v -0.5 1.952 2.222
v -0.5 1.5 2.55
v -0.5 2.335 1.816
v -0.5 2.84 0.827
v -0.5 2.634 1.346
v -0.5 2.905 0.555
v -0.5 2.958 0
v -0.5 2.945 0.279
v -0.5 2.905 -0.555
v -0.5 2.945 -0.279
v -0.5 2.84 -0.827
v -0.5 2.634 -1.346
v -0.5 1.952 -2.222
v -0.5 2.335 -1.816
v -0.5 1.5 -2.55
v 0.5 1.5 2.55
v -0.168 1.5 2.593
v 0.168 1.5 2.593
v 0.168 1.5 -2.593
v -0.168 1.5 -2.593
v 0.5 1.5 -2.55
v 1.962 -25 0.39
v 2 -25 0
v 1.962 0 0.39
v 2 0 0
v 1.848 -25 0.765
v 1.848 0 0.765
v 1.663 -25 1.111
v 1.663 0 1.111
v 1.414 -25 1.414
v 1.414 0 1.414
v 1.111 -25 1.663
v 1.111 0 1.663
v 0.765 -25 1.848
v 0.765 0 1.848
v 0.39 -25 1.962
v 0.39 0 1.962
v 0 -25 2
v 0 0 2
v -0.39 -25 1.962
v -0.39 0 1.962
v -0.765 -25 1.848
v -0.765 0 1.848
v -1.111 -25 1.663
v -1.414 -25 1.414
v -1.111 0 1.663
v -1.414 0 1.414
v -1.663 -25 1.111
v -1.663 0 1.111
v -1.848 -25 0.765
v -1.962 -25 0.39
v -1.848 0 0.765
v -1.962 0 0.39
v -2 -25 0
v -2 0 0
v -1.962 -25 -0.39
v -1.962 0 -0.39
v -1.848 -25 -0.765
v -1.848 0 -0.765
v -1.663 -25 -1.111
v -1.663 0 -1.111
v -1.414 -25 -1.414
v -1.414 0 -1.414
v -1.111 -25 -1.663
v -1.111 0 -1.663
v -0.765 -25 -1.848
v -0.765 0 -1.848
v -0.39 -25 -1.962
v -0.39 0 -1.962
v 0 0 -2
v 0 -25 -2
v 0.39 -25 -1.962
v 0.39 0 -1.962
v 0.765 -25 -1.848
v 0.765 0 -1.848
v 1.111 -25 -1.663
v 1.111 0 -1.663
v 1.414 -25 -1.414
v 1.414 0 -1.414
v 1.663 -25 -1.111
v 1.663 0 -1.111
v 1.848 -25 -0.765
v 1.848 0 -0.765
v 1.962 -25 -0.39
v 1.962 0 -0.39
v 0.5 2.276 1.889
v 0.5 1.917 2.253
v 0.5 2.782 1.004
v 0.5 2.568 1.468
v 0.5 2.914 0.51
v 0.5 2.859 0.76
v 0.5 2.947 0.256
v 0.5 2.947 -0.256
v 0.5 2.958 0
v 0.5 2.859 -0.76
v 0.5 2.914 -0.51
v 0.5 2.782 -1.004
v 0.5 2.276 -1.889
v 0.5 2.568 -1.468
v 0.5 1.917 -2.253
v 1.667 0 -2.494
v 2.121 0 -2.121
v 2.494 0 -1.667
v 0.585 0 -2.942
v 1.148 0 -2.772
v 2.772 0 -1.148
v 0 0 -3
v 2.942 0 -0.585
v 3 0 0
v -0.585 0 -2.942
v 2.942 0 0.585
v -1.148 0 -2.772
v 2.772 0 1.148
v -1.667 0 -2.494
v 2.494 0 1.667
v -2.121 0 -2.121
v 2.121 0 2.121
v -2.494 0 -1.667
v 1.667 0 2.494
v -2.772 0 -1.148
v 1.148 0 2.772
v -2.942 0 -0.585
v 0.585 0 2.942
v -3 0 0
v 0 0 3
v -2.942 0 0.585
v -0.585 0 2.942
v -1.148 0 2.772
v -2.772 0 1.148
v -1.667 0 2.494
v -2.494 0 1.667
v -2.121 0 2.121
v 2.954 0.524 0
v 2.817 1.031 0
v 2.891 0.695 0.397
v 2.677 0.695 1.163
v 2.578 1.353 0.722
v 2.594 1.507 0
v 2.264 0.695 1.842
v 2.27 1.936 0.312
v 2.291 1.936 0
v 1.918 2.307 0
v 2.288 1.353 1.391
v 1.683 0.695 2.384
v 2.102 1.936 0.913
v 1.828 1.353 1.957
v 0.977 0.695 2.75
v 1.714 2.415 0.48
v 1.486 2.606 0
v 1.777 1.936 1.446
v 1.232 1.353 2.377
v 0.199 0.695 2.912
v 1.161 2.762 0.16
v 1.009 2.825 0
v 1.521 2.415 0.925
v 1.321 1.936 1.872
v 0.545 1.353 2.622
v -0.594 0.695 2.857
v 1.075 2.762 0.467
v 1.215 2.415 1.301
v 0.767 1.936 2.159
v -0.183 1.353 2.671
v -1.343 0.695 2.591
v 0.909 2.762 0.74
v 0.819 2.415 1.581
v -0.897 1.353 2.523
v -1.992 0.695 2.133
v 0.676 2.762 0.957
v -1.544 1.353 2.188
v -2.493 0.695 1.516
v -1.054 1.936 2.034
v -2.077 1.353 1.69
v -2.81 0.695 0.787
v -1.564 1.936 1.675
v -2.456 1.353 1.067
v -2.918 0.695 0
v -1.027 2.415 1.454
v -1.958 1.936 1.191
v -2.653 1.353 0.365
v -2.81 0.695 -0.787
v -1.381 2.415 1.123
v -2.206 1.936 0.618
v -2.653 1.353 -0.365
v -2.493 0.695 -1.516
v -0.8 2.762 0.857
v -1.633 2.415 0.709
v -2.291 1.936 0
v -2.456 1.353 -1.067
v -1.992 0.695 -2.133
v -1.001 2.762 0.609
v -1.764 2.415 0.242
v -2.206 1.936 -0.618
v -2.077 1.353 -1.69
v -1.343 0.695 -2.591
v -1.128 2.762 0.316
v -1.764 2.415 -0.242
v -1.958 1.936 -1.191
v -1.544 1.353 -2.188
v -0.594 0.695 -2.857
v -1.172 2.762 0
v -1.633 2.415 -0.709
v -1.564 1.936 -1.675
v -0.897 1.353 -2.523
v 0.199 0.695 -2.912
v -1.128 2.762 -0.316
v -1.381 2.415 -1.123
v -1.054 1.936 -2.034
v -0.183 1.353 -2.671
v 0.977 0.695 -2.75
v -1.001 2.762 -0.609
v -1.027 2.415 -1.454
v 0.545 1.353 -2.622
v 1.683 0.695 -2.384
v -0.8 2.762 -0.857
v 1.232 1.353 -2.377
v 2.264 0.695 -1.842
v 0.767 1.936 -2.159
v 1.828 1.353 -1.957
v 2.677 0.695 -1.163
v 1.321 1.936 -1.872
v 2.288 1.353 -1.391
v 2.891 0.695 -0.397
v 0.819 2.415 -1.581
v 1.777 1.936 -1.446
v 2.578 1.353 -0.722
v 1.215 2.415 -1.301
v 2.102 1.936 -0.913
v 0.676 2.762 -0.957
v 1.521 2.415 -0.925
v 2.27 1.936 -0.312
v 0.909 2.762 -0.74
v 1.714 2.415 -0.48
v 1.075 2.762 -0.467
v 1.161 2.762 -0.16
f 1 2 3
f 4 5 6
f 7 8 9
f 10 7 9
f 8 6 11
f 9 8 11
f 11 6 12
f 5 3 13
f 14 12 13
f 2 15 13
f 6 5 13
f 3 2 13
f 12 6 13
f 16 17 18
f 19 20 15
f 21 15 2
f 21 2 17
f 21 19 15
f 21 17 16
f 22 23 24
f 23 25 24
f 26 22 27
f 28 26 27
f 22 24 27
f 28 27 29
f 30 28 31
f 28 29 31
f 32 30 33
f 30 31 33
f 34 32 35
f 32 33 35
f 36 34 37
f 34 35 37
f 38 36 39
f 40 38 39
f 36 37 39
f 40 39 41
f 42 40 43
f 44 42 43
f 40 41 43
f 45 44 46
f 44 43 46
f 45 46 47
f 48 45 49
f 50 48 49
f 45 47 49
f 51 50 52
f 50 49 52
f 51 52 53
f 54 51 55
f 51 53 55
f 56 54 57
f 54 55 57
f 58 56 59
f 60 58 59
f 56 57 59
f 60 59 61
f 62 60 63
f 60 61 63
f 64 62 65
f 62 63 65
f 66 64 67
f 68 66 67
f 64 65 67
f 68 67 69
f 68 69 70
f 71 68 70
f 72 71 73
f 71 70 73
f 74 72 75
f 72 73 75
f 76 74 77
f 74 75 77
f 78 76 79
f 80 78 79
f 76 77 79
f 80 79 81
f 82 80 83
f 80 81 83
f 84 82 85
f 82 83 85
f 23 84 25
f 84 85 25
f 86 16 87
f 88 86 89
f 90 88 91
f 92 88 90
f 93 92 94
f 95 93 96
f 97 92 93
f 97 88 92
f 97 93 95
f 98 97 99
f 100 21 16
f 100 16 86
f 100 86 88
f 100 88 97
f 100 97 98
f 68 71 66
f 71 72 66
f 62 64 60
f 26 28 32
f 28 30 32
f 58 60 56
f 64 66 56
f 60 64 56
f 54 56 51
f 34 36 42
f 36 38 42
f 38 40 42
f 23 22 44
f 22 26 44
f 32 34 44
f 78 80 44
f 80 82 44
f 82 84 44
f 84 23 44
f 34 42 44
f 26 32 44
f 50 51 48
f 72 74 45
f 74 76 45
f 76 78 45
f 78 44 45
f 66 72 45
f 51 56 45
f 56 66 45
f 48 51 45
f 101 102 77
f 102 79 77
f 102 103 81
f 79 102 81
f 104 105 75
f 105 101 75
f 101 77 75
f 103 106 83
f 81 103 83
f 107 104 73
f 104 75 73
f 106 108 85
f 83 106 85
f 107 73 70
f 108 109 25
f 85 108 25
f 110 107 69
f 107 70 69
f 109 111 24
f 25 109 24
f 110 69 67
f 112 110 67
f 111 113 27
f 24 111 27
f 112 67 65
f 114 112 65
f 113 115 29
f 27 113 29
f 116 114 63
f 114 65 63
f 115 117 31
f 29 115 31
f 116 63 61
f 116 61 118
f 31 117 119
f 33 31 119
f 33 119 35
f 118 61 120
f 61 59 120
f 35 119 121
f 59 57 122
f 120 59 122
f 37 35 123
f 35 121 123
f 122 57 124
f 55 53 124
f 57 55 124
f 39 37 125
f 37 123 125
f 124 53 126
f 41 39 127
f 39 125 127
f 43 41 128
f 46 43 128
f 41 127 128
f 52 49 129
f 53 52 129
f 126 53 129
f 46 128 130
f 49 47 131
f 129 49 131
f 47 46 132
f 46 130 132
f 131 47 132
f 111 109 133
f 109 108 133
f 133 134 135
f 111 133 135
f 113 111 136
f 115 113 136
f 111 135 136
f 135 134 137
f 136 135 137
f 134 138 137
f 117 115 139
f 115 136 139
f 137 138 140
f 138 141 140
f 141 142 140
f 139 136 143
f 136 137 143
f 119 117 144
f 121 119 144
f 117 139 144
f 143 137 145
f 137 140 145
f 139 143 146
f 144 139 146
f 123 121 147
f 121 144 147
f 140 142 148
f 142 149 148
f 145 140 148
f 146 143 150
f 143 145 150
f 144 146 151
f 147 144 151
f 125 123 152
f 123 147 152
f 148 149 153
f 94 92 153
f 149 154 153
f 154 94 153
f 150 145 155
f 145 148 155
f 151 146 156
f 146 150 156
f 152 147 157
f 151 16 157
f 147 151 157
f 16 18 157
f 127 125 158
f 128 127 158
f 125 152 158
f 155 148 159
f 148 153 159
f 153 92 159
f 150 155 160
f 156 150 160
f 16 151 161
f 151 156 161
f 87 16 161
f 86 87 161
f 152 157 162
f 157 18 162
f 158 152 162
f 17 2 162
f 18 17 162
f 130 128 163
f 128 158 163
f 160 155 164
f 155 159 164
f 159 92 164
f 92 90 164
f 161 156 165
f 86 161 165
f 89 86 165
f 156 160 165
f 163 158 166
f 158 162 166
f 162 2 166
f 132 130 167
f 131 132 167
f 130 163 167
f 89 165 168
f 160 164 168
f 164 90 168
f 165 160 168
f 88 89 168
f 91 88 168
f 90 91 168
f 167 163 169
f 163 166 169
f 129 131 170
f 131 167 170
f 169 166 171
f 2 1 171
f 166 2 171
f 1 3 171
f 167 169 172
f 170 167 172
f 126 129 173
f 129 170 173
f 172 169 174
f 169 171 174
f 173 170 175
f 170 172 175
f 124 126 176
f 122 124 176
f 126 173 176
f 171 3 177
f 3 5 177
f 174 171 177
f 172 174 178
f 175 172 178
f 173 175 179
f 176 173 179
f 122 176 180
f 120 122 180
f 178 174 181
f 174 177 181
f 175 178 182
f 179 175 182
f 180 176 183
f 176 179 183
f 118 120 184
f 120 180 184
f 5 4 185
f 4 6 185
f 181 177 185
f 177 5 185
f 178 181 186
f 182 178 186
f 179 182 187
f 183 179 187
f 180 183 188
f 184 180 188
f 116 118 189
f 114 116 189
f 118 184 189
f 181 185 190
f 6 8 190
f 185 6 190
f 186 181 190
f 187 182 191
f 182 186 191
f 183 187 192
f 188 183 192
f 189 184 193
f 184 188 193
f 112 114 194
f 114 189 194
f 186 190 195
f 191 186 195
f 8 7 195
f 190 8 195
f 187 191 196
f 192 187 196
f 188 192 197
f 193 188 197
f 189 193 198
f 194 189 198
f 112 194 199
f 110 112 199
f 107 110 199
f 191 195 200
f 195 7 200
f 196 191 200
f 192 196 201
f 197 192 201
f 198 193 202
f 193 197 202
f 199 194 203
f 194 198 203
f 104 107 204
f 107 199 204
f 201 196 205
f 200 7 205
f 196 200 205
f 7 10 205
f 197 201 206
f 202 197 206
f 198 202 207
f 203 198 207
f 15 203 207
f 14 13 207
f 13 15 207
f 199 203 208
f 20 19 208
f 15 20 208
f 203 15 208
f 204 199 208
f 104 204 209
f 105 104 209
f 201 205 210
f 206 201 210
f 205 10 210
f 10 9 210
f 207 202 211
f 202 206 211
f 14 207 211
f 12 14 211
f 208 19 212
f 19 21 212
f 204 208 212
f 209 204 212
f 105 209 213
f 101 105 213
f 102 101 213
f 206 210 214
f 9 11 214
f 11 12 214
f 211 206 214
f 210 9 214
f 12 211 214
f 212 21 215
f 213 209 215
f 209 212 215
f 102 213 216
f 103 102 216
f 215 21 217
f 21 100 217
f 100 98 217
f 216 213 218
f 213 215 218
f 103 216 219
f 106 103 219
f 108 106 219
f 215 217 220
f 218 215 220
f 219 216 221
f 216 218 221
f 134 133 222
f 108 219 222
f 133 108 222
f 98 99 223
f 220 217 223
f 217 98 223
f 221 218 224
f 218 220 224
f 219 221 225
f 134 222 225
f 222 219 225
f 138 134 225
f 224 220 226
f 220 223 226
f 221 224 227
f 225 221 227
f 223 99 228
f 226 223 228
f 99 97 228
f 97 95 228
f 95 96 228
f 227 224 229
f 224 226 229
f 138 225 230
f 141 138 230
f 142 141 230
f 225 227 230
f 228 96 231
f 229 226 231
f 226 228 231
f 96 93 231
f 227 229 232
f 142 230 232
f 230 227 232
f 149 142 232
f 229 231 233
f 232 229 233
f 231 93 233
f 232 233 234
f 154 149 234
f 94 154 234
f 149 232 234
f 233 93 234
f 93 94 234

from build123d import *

# Parameters (mm, degrees)
SKETCH1_W               = 2
SKETCH1_H               = 25
SKETCH2_W               = 0.5
SKETCH2_H               = 1.642734333
CUT_EXTRUDE1_DEPTH      = 4
CUT_EXTRUDE1_DEPTH_BACK = 4


with BuildPart() as part:
    # Sketch1 → Revolve1 (revolve)
    with BuildSketch(Plane.XY):
        with Locations((1, -12.5)):
            Rectangle(SKETCH1_W, SKETCH1_H)
        with BuildLine():
            Line((0, 0), (3, 0))
            ThreePointArc((3, 0), (2.121320344, 2.121320344), (0, 3))
            Line((0, 3), (0, 0))
        make_face()
    revolve(axis=Axis((0, 3, 0), (0, -1, 0)))

    # Sketch2 → Cut-Extrude1 (cut, two sides)
    with BuildSketch(Plane.XY) as cut_extrude1_sk:
        with Locations((-0.25, 2.321367166)):
            Rectangle(SKETCH2_W, SKETCH2_H)
        with Locations((0.25, 2.321367166)):
            Rectangle(SKETCH2_W, SKETCH2_H)
    extrude(amount=CUT_EXTRUDE1_DEPTH, mode=Mode.SUBTRACT)
    extrude(cut_extrude1_sk.sketch, amount=-CUT_EXTRUDE1_DEPTH_BACK, mode=Mode.SUBTRACT)


solid = part.part
